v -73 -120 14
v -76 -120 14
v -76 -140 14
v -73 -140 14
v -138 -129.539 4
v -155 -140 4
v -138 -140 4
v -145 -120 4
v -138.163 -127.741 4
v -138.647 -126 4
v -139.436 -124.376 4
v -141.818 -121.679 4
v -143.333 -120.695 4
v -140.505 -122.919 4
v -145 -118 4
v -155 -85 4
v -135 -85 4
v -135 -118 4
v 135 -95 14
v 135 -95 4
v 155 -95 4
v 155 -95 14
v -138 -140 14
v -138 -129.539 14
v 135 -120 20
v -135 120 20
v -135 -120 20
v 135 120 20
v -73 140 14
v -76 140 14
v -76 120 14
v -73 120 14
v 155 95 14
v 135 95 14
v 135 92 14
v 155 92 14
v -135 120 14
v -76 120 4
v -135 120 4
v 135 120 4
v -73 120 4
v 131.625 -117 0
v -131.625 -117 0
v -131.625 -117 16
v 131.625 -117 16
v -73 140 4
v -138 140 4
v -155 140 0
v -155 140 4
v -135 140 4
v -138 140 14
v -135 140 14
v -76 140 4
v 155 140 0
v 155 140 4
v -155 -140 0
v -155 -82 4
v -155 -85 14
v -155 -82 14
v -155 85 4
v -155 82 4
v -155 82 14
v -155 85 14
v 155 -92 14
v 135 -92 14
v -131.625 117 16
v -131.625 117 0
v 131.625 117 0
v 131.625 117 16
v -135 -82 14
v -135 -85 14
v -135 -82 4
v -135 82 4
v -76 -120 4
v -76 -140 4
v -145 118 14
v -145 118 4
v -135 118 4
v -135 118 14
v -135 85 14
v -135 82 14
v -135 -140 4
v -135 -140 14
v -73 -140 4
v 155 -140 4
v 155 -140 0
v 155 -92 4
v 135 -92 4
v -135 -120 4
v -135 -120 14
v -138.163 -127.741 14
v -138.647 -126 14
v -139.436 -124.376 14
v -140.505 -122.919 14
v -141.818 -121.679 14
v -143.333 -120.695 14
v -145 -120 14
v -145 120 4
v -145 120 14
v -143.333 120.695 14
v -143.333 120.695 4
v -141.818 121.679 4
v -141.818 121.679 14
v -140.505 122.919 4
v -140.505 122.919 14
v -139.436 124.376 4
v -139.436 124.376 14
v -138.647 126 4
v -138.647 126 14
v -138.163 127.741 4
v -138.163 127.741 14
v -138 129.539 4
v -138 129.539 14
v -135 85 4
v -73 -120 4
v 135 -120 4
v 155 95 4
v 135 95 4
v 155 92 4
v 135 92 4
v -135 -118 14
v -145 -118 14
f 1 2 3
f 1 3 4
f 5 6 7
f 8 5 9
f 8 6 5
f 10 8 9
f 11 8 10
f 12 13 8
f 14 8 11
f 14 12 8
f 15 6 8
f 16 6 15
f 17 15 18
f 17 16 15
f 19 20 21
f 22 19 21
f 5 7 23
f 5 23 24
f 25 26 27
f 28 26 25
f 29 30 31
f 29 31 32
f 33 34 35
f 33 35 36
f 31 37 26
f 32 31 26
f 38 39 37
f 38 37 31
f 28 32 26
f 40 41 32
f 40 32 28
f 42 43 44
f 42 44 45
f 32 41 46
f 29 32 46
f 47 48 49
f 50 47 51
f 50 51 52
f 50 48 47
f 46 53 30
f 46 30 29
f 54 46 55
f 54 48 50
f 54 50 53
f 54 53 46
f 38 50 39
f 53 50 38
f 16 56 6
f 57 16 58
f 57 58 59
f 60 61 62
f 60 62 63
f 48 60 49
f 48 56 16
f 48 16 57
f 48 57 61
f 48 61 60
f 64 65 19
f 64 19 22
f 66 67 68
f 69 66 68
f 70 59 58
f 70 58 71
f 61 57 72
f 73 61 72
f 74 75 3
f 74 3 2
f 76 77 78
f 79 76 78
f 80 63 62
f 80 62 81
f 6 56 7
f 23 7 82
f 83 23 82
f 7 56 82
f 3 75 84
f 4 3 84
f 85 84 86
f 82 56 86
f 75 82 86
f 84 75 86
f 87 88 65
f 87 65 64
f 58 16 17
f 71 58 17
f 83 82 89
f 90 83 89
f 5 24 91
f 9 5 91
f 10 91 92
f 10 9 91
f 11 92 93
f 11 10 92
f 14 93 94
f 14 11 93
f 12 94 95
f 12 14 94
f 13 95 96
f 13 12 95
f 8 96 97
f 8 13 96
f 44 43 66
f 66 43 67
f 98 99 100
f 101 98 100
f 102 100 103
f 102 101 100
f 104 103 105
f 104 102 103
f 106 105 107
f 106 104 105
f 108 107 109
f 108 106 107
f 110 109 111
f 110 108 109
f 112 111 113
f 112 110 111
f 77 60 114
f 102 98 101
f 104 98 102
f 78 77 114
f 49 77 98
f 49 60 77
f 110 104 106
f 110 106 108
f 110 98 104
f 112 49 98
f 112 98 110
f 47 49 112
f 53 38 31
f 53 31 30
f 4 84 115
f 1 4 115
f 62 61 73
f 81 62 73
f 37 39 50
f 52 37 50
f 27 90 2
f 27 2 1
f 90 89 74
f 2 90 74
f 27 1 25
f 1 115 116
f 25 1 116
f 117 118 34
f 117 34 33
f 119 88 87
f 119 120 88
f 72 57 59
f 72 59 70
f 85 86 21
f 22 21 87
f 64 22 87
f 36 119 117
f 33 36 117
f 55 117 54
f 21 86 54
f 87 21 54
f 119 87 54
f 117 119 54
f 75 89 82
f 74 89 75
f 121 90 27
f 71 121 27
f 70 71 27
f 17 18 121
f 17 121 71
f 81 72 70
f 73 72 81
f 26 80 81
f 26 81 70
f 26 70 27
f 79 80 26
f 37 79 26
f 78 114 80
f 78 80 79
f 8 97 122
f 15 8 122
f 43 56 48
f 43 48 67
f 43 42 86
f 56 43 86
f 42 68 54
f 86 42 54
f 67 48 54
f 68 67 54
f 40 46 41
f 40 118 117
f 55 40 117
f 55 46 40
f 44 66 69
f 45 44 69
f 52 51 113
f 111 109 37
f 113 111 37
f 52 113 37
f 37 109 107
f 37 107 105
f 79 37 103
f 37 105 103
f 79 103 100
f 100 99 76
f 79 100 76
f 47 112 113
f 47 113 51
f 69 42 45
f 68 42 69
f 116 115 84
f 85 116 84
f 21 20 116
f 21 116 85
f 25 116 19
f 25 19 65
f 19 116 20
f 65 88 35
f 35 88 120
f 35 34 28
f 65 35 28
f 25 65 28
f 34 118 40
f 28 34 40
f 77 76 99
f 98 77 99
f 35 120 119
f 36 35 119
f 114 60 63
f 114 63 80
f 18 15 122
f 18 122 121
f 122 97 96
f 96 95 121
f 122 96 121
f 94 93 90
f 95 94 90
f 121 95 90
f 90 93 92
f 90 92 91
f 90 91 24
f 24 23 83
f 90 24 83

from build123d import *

# Parameters (mm, degrees)
SKETCH1_W                = 310
SKETCH1_H                = 280
SKETCH1_W_2              = 270
SKETCH1_H_2              = 240
BOSS_EXTRUDE1_DEPTH      = 4
BOSS_EXTRUDE3_DEPTH      = 16
BOSS_EXTRUDE3_DEPTH_BACK = 4
SKETCH2_W                = 270
SKETCH2_H                = 240
SKETCH2_W_2              = 263.25
SKETCH2_H_2              = 234
SKETCH4_W                = 263.25
SKETCH4_H                = 234
BOSS_EXTRUDE4_DEPTH      = 4
SKETCH6_W                = 20
SKETCH6_H                = 3
SKETCH6_W_2              = 10
SKETCH6_H_2              = 2
BOSS_EXTRUDE5_DEPTH      = 10
SKETCH7_W                = 3
SKETCH7_H                = 20
BOSS_EXTRUDE6_DEPTH      = 10
FILLET1_R                = 10


with BuildPart() as part:
    # Sketch1 → Boss-Extrude1 (new body)
    with BuildSketch(Plane.XY):
        Rectangle(SKETCH1_W, SKETCH1_H)
        Rectangle(SKETCH1_W_2, SKETCH1_H_2, mode=Mode.SUBTRACT)
    extrude(amount=BOSS_EXTRUDE1_DEPTH)

    # Sketch2 → Boss-Extrude3 (add, two sides: drawn at the far end of the back side and taken through both)
    with BuildSketch(Plane.XY.offset(4).offset(-BOSS_EXTRUDE3_DEPTH_BACK)):
        Rectangle(SKETCH2_W, SKETCH2_H)
        Rectangle(SKETCH2_W_2, SKETCH2_H_2, mode=Mode.SUBTRACT)
    extrude(amount=BOSS_EXTRUDE3_DEPTH + BOSS_EXTRUDE3_DEPTH_BACK)

    # Sketch4 → Boss-Extrude4 (add)
    with BuildSketch(Plane.XY.offset(20)):
        Rectangle(SKETCH4_W, SKETCH4_H)
    extrude(amount=-BOSS_EXTRUDE4_DEPTH)

    # Sketch6 → Boss-Extrude5 (add)
    with BuildSketch(Plane.XY.offset(4)):
        with Locations((-145, 83.5)):
            Rectangle(SKETCH6_W, SKETCH6_H)
        with Locations((145, 93.5)):
            Rectangle(SKETCH6_W, SKETCH6_H)
        with Locations((145, -93.5)):
            Rectangle(SKETCH6_W, SKETCH6_H)
        with Locations((-145, -83.5)):
            Rectangle(SKETCH6_W, SKETCH6_H)
        with Locations((-140, -119)):
            Rectangle(SKETCH6_W_2, SKETCH6_H_2)
        with Locations((-140, 119)):
            Rectangle(SKETCH6_W_2, SKETCH6_H_2)
    extrude(amount=BOSS_EXTRUDE5_DEPTH)

    # Sketch7 → Boss-Extrude6 (add)
    with BuildSketch(Plane.XY.offset(4)):
        with Locations((-136.5, 130)):
            Rectangle(SKETCH7_W, SKETCH7_H)
        with Locations((-74.5, 130)):
            Rectangle(SKETCH7_W, SKETCH7_H)
        with Locations((-136.5, -130)):
            Rectangle(SKETCH7_W, SKETCH7_H)
        with Locations((-74.5, -130)):
            Rectangle(SKETCH7_W, SKETCH7_H)
    extrude(amount=BOSS_EXTRUDE6_DEPTH)

    # Fillet1
    # the kernel refuses this fillet: 10 mm, written as the material it adds along each edge
    with BuildSketch(Plane(origin=(-138, -120, 4), x_dir=(-1, 0, 0), z_dir=(0, 0, 1))) as fillet1_piece_1:
        with BuildLine():
            CenterArc((10, 9.539392014), FILLET1_R, 180, 72.542396876)
            Line((0, 9.539392014), (-0.2, 9.539392014))
            Line((-0.2, 9.539392014), (-0.2, 0))
            Line((-0.2, 0), (0, -0.2))
            ThreePointArc((0, -0.2), (3.5, -0.2), (6.94, -0.19078784))
            Line((6.94, -0.19078784), (7, 0))
        make_face()
    extrude(amount=10)
    with BuildSketch(Plane(origin=(-138, 120, 4), x_dir=(0, 1, 0), z_dir=(0, 0, 1))) as fillet1_piece_2:
        with BuildLine():
            CenterArc((9.539392014, 10), FILLET1_R, 197.457603124, 72.542396876)
            Line((0, 7), (-0.19078784, 6.94))
            ThreePointArc((-0.19078784, 6.94), (-0.2, 3.5), (-0.2, 0))
            Line((-0.2, 0), (0, -0.2))
            Line((0, -0.2), (9.539392014, -0.2))
            Line((9.539392014, -0.2), (9.539392014, 0))
        make_face()
    extrude(amount=10)


solid = part.part
